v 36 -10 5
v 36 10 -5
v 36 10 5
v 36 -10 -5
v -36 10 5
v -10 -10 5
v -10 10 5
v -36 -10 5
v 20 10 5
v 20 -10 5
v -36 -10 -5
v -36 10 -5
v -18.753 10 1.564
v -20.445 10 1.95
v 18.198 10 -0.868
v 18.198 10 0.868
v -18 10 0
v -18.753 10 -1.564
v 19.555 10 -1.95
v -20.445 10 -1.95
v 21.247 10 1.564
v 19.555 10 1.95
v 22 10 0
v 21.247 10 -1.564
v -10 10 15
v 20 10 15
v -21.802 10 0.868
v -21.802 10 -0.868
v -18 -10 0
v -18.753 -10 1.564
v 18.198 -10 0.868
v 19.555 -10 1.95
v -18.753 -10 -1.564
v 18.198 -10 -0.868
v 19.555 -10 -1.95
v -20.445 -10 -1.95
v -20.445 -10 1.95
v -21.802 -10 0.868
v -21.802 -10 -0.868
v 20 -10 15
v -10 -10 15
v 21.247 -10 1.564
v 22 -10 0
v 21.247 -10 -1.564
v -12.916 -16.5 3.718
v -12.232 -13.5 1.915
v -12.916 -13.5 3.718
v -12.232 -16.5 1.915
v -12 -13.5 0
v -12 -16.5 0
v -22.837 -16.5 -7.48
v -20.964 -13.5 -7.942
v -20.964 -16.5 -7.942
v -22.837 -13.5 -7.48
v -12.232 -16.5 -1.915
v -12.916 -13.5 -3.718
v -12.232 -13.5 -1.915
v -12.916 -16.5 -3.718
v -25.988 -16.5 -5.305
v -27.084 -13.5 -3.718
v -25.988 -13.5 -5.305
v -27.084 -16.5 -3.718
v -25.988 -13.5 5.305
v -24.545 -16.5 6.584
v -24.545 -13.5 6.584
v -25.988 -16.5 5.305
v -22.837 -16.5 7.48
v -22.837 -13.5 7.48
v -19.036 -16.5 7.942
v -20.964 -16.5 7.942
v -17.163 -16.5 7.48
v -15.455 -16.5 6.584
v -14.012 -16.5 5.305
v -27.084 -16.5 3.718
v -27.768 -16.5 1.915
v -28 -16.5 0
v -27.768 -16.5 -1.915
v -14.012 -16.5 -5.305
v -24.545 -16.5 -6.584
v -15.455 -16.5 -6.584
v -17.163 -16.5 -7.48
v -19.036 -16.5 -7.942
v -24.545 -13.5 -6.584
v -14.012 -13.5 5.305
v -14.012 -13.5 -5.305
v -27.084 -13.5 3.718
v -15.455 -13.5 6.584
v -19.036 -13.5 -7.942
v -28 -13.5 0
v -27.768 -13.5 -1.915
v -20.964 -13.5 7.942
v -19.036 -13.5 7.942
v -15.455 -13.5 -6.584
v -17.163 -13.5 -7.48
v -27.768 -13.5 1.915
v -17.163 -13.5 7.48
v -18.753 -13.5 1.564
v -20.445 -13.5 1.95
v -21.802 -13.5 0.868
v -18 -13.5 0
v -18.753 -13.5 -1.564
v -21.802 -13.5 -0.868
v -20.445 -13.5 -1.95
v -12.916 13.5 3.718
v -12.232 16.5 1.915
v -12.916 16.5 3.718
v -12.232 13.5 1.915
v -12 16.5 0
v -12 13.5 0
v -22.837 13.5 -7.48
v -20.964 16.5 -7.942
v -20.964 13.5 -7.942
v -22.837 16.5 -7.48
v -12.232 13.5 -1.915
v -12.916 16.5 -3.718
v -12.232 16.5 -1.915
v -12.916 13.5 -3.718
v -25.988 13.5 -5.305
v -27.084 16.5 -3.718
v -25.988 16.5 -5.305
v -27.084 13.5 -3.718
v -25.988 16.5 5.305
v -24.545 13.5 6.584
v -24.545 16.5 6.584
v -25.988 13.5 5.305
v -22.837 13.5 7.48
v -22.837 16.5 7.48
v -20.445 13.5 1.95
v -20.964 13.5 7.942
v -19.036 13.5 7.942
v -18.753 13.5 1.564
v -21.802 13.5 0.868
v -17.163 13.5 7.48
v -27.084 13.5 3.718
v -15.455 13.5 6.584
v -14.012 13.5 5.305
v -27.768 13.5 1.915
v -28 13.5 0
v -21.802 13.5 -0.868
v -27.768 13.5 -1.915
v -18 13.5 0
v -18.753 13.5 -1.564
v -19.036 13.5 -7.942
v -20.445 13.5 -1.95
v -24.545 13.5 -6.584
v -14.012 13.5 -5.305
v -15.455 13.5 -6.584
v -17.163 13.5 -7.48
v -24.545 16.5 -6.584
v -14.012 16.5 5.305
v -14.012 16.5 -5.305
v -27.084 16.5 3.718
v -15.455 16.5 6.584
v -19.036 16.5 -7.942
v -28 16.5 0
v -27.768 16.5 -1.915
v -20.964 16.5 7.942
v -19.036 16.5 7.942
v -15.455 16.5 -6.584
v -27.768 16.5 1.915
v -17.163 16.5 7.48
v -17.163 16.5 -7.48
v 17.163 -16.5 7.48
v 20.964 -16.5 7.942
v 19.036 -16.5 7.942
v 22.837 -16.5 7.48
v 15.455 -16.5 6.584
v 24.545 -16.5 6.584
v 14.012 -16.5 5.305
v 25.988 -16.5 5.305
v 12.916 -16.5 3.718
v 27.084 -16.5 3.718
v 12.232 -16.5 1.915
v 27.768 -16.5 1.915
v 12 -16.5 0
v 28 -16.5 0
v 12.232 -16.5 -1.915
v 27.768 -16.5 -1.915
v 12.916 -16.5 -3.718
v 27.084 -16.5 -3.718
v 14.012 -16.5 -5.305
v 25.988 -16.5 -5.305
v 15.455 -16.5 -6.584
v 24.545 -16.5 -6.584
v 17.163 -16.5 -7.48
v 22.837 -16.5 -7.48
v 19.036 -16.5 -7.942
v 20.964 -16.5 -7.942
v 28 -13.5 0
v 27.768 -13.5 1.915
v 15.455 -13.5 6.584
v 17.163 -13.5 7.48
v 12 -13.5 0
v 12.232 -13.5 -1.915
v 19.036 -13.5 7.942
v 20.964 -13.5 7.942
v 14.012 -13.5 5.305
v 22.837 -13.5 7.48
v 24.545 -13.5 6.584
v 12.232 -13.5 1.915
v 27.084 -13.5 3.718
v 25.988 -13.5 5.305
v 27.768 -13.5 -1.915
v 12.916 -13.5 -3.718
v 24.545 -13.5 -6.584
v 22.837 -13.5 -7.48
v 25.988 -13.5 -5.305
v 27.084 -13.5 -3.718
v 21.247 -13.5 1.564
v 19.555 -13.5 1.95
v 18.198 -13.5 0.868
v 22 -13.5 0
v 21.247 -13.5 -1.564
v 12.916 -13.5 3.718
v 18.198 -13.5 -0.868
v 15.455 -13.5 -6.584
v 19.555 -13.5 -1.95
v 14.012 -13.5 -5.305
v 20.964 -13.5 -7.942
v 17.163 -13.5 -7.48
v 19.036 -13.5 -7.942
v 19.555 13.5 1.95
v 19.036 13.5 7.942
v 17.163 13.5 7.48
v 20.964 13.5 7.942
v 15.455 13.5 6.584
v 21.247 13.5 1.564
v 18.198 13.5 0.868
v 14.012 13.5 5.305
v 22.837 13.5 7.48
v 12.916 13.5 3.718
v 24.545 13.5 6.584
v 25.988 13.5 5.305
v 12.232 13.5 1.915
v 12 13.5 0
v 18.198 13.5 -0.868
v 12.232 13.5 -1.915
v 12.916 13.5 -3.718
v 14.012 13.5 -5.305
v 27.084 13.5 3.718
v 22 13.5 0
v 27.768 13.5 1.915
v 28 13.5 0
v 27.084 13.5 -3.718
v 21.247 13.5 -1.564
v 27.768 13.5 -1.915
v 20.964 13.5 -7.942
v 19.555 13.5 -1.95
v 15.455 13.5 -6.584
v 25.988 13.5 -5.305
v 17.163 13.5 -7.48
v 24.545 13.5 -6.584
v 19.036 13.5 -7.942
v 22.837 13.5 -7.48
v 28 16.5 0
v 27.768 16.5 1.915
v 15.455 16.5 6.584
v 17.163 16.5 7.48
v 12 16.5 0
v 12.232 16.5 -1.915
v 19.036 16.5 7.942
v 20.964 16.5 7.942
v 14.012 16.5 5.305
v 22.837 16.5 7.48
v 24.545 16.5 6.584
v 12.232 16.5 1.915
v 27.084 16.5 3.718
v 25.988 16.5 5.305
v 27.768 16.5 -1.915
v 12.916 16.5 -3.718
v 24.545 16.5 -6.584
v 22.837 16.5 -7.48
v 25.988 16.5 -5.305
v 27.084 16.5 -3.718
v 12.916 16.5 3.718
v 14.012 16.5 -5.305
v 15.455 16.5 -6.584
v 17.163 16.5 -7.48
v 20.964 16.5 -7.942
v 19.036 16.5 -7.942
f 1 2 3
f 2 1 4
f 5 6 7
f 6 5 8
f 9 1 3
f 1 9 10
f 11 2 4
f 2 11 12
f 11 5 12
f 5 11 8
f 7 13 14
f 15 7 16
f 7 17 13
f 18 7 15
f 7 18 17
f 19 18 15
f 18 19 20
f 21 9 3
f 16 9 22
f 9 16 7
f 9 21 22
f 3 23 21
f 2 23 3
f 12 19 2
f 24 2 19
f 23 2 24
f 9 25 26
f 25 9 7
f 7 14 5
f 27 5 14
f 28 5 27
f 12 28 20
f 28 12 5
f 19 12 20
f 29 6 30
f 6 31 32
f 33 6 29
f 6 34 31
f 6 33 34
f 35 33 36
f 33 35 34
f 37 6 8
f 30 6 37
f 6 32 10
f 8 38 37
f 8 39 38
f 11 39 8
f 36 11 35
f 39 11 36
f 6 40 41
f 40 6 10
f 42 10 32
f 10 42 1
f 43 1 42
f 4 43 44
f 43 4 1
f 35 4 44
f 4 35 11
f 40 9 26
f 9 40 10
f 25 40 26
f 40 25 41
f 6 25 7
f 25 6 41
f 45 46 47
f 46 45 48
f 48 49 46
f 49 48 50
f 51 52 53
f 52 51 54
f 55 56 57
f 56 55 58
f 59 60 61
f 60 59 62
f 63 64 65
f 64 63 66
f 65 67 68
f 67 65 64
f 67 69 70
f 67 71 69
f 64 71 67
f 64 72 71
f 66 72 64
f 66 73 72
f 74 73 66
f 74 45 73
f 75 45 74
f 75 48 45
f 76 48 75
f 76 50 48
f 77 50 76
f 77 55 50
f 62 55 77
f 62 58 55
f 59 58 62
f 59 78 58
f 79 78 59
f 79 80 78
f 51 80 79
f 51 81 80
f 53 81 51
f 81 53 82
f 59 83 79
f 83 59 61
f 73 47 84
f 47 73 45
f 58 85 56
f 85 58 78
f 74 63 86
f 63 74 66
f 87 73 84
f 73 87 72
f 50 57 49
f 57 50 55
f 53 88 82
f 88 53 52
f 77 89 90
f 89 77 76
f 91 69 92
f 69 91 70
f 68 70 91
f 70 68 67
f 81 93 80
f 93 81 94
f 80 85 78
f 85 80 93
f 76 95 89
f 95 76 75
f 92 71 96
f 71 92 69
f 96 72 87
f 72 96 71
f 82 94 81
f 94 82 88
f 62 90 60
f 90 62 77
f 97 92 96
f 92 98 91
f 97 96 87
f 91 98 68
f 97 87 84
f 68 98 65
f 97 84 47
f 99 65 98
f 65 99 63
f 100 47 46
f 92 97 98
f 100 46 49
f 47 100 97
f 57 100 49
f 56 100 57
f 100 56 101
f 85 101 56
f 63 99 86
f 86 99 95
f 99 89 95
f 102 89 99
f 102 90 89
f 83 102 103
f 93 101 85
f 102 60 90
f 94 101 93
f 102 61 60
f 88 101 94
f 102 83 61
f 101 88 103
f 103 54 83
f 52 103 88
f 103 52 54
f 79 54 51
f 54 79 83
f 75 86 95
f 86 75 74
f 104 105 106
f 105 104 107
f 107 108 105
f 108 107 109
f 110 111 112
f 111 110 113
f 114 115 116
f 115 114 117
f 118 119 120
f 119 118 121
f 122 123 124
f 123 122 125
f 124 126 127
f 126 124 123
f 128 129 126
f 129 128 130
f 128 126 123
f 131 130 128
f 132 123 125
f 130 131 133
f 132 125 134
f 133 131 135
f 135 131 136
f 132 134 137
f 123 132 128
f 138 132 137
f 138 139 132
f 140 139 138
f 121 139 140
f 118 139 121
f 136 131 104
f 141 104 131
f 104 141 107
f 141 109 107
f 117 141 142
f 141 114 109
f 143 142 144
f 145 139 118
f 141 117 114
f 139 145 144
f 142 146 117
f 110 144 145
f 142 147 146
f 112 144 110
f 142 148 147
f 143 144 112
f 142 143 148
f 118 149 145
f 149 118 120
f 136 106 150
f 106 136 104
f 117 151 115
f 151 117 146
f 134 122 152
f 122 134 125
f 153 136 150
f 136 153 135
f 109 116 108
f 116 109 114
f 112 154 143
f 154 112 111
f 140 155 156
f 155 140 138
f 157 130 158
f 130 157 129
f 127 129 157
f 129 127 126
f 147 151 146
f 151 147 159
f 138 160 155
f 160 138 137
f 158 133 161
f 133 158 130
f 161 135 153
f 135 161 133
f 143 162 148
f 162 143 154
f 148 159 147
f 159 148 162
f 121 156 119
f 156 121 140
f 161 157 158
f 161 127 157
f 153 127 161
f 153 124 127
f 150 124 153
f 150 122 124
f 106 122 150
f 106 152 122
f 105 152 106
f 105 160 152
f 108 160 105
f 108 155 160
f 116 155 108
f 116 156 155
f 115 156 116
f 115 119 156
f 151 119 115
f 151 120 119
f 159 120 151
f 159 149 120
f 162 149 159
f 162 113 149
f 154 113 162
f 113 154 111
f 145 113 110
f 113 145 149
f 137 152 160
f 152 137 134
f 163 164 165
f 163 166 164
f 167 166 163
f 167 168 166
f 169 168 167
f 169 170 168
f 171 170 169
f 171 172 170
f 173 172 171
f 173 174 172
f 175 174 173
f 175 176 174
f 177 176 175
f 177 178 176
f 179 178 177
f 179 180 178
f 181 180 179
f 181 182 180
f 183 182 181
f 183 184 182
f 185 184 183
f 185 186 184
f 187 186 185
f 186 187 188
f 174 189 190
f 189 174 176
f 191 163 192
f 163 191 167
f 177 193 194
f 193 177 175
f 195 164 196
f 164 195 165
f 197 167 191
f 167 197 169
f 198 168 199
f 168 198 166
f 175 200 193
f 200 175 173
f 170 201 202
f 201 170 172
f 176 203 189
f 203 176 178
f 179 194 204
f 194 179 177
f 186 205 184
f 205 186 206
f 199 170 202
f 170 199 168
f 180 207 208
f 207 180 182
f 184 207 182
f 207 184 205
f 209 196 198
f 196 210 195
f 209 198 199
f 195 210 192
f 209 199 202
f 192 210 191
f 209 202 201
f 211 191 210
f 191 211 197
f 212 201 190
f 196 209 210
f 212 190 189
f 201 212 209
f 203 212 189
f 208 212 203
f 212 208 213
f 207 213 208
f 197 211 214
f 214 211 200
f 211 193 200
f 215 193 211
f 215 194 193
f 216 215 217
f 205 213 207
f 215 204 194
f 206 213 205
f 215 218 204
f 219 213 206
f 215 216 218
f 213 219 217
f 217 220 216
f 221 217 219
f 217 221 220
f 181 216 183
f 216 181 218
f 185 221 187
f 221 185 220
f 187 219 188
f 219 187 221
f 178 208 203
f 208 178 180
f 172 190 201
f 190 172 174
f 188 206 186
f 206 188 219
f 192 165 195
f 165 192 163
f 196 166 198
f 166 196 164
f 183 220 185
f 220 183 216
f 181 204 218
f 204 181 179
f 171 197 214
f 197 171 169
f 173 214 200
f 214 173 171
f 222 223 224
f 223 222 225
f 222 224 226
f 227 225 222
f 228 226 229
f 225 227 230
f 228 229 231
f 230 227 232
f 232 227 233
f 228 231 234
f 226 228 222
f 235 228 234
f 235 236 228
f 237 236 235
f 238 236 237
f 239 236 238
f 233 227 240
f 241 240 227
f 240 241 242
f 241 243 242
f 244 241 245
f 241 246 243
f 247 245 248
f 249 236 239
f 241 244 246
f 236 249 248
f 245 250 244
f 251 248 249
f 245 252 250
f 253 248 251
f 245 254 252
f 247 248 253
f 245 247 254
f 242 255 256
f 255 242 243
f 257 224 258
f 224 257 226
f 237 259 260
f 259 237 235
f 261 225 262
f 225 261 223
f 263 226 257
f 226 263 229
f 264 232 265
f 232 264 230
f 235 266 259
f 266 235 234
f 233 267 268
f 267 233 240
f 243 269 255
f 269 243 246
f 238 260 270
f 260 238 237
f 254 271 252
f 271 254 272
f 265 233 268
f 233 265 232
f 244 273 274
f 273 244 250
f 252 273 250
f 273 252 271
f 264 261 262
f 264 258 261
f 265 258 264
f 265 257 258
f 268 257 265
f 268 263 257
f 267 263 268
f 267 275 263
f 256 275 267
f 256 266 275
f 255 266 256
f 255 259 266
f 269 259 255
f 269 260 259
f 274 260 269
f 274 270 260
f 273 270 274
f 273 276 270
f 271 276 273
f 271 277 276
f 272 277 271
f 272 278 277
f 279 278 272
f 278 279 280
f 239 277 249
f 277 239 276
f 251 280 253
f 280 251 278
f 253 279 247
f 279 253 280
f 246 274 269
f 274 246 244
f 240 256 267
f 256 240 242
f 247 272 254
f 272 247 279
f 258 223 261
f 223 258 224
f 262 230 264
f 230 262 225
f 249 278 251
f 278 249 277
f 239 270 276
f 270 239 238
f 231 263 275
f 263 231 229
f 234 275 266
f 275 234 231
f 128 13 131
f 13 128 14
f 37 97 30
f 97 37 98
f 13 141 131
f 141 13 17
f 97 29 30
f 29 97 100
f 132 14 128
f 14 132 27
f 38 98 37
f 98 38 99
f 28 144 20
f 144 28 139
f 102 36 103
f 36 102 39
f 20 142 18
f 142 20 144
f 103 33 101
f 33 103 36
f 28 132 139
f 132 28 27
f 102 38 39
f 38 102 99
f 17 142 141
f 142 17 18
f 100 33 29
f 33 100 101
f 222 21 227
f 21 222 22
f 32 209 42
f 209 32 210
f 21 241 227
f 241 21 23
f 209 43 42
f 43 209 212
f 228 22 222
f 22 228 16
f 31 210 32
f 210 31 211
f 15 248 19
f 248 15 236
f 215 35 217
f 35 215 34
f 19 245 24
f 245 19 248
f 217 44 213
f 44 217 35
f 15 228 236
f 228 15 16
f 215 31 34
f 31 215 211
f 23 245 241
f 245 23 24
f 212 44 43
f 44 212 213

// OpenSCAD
//2do.  ejemplo de OPENSCAD

//Cuerpo del carro
scale([1.2,1,1])
    cube([60,20,10],center=true);
//Parte superior del carro
translate([5,0,10])
    cube([30,20,10],center=true);

//Llantas
translate([-20,-15.0,0])
    rotate([90,0,0])
        cylinder(h=3,r=8,center=true);
translate([-20,15.0,0])
    rotate([90,0,0])
        cylinder(h=3,r=8,center=true);
translate([20,-15,0])
    rotate([90,0,0])
    cylinder(h=3,r=8,center=true);
translate([20,15,0])
    rotate([90,0,0])
    cylinder(h=3,r=8,center=true);

//Ejes
translate([-20,0,0])
    rotate([90,0,0])
    cylinder(h=30,r=2,center=true);
translate([20,0,0])
    rotate([90,0,0])
    cylinder(h=30,r=2,center=true);
